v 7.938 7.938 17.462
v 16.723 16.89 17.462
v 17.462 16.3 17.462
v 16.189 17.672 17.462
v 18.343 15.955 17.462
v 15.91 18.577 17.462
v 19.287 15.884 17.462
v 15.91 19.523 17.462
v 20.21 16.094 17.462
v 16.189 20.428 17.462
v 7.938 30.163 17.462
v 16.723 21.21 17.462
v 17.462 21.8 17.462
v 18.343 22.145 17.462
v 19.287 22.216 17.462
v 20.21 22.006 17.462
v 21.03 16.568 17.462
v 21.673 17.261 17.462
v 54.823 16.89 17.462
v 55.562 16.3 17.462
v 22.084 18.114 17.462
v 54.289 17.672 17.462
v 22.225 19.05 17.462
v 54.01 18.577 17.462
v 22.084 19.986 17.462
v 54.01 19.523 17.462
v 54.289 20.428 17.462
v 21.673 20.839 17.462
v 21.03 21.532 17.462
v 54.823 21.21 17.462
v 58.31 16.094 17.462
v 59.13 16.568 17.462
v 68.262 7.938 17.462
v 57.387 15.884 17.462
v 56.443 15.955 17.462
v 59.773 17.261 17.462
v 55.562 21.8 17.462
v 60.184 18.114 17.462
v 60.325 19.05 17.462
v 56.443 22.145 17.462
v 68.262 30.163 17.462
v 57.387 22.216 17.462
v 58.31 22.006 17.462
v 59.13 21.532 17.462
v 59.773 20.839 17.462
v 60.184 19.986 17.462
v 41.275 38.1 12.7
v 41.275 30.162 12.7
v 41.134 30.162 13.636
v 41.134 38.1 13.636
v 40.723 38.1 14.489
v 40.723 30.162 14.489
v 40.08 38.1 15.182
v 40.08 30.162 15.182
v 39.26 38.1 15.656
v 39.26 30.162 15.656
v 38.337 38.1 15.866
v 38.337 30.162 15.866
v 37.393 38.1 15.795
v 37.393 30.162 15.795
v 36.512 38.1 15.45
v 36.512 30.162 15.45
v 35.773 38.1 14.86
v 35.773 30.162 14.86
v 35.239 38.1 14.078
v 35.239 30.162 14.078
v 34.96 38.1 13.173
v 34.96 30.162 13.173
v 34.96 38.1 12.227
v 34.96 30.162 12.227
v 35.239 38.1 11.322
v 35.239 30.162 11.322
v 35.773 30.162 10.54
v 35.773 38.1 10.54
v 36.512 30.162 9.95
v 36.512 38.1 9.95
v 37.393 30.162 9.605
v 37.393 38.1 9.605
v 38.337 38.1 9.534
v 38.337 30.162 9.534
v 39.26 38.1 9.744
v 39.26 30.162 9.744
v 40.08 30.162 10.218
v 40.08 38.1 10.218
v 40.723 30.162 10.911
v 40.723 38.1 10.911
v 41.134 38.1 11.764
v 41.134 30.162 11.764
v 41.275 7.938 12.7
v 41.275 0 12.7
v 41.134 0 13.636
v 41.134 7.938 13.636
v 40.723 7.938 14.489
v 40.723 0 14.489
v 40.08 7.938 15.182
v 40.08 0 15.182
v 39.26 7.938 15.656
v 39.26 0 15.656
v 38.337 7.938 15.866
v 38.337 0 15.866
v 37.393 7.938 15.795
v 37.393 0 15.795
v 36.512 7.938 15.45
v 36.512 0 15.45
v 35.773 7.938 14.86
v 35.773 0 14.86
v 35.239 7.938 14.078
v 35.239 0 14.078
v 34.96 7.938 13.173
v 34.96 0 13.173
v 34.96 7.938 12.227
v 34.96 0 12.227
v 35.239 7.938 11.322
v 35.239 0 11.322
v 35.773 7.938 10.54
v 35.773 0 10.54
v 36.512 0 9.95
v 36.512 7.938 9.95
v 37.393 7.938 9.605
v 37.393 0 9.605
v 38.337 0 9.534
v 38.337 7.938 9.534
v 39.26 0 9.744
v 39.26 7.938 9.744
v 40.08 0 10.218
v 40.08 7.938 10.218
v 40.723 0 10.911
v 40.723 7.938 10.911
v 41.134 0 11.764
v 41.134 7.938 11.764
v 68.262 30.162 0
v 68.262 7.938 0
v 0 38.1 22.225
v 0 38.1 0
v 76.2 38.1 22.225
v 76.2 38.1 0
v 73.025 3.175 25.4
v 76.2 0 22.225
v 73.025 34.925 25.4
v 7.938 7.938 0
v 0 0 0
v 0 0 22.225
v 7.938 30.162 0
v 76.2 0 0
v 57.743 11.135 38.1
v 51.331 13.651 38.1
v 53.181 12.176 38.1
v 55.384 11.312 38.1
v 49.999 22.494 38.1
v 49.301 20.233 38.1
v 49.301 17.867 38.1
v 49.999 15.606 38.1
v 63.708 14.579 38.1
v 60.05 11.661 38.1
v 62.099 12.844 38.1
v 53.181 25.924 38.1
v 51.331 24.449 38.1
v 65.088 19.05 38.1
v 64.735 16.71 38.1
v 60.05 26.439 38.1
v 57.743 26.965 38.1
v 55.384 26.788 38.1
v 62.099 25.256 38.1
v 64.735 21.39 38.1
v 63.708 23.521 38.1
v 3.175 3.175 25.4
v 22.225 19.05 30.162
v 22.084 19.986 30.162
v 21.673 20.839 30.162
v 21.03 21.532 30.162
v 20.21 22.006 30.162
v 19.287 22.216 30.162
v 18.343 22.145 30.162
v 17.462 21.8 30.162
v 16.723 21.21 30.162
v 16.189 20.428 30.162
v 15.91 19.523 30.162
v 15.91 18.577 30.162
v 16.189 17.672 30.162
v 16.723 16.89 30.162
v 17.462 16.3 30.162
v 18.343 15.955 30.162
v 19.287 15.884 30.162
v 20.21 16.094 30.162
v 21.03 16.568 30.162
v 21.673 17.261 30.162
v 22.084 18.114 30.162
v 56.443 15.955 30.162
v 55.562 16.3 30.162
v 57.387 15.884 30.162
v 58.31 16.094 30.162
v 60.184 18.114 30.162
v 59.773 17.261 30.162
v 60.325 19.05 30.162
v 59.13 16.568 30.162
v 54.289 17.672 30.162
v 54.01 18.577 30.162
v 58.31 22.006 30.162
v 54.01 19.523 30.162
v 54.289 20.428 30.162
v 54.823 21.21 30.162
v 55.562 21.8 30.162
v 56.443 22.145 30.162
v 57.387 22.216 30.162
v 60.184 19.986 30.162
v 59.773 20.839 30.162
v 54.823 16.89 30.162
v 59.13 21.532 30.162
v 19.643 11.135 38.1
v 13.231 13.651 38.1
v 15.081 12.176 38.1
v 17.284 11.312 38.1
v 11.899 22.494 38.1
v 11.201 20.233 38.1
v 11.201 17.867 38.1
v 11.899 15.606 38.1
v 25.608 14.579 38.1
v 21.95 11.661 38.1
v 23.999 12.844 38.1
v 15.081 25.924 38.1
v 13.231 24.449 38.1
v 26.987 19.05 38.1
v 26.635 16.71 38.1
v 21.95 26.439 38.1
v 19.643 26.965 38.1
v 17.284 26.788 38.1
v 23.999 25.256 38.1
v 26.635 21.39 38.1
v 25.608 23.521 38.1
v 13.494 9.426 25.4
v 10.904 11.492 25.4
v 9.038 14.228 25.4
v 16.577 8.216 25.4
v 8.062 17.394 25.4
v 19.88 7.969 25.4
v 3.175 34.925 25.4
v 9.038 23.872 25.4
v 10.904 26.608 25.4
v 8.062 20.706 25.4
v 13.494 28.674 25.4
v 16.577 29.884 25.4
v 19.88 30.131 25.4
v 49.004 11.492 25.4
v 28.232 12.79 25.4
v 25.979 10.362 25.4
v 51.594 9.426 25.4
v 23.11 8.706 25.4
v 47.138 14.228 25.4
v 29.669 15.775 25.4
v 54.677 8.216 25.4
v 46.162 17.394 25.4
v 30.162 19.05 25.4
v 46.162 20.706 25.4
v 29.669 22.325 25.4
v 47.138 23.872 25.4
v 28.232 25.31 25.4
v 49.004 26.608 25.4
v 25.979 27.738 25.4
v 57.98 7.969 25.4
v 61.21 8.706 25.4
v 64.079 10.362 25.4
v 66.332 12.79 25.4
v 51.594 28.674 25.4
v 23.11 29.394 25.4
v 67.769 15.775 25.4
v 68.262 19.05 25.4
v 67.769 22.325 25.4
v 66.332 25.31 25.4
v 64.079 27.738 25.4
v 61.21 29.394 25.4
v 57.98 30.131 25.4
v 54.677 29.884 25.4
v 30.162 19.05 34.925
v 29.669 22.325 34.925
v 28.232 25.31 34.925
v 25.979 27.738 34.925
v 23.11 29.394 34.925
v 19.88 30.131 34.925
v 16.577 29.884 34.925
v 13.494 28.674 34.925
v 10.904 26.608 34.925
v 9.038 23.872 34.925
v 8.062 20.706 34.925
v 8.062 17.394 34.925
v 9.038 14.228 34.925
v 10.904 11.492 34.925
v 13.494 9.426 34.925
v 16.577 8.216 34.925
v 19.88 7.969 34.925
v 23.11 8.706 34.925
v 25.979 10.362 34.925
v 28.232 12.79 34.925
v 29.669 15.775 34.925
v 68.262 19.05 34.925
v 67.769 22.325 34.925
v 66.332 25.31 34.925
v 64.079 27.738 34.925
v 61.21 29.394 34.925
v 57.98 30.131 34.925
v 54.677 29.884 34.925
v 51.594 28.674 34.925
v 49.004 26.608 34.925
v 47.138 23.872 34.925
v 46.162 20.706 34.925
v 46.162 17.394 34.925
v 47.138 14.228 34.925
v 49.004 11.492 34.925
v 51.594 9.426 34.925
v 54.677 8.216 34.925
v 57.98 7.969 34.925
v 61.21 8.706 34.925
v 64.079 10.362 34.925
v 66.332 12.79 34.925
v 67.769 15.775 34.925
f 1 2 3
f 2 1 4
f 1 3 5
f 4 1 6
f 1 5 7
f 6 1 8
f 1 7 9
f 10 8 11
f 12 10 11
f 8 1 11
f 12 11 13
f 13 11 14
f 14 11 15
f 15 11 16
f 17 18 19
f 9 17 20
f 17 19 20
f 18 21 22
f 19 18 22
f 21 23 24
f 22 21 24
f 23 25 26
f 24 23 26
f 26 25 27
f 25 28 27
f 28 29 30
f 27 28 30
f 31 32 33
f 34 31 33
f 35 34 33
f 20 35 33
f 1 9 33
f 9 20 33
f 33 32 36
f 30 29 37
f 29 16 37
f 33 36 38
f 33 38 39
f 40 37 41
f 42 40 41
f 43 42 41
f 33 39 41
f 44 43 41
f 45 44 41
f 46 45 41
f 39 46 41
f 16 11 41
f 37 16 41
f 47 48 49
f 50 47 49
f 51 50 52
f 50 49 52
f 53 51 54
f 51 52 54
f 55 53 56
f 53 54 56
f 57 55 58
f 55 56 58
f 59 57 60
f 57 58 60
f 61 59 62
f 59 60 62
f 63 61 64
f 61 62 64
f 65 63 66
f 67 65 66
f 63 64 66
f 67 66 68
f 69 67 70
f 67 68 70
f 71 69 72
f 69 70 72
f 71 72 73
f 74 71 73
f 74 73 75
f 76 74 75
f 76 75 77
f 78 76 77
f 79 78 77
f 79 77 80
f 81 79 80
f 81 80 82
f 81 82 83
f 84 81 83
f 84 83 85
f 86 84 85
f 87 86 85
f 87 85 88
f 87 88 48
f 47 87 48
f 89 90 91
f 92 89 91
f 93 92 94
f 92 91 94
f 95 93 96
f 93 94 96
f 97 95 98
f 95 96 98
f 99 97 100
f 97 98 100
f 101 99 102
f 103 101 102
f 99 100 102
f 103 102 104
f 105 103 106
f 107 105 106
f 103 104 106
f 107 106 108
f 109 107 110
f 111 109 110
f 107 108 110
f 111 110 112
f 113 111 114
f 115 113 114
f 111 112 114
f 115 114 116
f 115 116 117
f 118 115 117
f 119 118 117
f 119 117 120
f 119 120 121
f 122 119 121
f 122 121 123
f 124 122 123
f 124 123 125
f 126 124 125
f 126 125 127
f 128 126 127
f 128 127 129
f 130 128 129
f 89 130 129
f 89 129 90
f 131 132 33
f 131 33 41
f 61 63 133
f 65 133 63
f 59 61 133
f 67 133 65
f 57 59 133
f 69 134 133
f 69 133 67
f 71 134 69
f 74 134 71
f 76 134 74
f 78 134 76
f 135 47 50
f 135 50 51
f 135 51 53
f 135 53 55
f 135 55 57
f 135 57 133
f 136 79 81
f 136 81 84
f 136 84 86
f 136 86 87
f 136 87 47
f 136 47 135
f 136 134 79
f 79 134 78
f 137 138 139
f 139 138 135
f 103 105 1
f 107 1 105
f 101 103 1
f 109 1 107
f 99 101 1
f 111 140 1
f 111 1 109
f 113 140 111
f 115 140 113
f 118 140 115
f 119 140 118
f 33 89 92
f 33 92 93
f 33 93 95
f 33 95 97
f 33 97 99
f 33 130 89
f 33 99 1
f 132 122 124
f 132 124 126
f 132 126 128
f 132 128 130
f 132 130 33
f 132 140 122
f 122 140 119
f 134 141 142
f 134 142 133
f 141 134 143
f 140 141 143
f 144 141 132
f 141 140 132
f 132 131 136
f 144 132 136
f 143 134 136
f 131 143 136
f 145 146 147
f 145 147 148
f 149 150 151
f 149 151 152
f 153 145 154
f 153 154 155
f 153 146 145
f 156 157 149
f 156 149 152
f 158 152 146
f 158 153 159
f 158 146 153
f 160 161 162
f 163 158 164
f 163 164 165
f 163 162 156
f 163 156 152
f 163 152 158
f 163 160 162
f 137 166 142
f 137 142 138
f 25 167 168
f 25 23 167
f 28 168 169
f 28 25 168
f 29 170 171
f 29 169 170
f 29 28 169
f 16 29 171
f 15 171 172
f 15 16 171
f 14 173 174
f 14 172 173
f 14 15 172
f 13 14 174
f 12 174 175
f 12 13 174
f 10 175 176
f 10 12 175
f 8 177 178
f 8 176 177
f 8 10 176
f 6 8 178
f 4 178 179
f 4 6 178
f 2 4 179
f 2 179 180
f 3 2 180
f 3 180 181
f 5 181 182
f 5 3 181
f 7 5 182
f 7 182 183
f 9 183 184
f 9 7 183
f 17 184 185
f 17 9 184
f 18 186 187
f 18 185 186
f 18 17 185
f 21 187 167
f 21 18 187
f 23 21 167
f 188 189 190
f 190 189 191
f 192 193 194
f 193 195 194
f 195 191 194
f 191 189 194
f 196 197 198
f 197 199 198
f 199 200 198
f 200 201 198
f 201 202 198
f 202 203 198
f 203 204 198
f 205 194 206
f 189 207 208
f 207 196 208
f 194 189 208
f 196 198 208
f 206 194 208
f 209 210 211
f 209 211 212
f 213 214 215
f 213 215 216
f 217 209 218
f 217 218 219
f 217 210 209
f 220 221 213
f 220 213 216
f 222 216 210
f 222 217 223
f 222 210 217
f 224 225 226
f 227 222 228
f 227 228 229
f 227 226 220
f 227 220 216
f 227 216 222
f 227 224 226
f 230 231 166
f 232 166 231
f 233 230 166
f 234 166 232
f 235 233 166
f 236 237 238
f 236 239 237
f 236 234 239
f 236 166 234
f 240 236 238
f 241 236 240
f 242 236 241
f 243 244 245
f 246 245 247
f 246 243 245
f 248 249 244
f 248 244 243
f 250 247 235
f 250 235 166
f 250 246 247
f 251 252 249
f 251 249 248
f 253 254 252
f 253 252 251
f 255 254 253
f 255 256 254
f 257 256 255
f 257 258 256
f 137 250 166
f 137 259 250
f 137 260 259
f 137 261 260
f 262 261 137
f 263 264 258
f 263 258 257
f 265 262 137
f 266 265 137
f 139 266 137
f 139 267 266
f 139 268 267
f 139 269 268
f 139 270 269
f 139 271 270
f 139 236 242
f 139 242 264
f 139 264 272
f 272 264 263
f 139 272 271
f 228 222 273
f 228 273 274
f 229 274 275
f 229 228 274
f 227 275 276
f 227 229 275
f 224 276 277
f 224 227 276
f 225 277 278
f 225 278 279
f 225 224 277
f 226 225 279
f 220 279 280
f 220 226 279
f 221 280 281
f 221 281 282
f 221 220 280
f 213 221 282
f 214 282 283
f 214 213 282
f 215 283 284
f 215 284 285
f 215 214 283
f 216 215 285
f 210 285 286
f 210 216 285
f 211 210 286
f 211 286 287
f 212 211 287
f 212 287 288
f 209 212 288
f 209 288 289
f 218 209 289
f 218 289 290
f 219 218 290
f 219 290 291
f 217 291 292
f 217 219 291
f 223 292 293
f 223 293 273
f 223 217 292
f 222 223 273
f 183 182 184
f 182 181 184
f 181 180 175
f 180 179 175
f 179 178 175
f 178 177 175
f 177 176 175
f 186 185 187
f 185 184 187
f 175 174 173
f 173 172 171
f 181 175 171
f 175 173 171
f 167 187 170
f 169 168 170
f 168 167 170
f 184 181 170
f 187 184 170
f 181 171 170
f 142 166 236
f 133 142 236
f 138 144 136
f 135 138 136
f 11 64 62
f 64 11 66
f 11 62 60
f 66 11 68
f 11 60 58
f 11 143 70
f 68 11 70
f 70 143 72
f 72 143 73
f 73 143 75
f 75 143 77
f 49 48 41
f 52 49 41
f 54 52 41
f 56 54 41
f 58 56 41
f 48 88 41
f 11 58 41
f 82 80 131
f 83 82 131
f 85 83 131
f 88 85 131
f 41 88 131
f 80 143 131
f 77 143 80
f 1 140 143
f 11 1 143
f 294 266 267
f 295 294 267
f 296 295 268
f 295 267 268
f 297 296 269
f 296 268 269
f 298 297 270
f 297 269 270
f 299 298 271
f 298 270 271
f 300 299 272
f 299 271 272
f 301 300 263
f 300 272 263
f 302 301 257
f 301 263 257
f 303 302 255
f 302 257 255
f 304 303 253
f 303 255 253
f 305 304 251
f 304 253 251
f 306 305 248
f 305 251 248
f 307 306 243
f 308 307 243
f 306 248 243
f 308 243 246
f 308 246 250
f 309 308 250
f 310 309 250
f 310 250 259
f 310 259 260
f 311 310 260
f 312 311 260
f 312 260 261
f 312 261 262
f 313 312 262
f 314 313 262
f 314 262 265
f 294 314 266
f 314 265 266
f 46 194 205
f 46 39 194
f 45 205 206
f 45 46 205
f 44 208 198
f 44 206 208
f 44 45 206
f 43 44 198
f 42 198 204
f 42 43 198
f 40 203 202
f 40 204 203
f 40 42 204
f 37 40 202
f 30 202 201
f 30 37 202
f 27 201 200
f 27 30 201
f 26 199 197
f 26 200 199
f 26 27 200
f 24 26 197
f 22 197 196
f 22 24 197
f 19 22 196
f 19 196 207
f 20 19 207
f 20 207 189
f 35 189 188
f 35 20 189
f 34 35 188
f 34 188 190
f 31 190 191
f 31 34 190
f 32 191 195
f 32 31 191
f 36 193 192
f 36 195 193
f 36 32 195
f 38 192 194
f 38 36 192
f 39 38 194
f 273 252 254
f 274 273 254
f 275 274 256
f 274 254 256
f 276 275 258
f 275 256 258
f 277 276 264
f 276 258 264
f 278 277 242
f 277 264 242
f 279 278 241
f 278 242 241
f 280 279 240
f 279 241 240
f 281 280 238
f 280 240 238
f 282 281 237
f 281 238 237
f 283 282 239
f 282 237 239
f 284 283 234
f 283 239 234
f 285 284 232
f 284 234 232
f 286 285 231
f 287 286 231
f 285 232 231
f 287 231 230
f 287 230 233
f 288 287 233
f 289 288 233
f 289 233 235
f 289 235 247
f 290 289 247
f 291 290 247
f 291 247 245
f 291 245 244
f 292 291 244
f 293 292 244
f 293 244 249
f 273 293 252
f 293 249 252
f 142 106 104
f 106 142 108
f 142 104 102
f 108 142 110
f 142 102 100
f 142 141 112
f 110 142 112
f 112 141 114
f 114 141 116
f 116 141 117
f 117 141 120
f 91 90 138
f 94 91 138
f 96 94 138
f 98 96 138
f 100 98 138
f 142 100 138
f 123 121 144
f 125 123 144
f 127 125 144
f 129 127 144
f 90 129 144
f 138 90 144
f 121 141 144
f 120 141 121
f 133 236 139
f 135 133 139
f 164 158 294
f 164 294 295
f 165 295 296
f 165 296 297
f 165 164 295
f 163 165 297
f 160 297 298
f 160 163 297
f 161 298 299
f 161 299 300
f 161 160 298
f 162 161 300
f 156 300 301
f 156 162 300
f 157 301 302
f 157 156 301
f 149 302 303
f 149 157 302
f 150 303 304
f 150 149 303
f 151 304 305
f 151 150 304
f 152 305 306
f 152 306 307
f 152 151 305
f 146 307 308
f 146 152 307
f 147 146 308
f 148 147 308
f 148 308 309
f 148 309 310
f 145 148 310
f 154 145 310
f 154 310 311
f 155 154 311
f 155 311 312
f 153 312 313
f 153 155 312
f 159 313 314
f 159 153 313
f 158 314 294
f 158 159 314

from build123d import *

# Parameters (mm, degrees)
F0_W     = 76.2
F0_H     = 38.1
F1_DEPTH = 25.4
F2_R     = 11.1125
F3_DEPTH = 12.7
F4_T     = -7.9375
F5_R     = 3.175
F6_DEPTH = 38.1
F7_SIZE2 = 3.175
F7_SIZE  = 3.175


with BuildPart() as f1:
    # F0 (on Top) → F1 (new body)
    with BuildSketch(Plane.XY):
        with Locations((38.1, 19.05)):
            Rectangle(F0_W, F0_H)
    extrude(amount=F1_DEPTH)

    # F2 (on face) → F3 (join)
    with BuildSketch(Plane.XY.offset(25.4)):
        with Locations((19.05, 19.05)):
            Circle(F2_R)
        with Locations((57.15, 19.05)):
            Circle(F2_R)
    extrude(amount=F3_DEPTH)

    # F4
    f4_openings = [f1.faces().sort_by_distance(p)[0] for p in [
        (38.1, 19.05, 0),
    ]]
    offset(amount=F4_T, openings=f4_openings, kind=Kind.INTERSECTION)

    # F5 (on face) → F6 (cut)
    with BuildSketch(Plane.XZ):
        with Locations((38.1, 12.7)):
            Circle(F5_R)
    extrude(amount=-F6_DEPTH, mode=Mode.SUBTRACT)

    # F7
    f7_edges = [f1.edges().sort_by_distance(p)[0] for p in [
        (7.9375, 19.05, 38.1),
        (46.0375, 19.05, 38.1),
        (38.1, 0, 25.4),
        (0, 19.05, 25.4),
        (38.1, 38.1, 25.4),
        (76.2, 19.05, 25.4),
    ]]
    chamfer(f7_edges, length=F7_SIZE, length2=F7_SIZE2)


solid = f1.part
